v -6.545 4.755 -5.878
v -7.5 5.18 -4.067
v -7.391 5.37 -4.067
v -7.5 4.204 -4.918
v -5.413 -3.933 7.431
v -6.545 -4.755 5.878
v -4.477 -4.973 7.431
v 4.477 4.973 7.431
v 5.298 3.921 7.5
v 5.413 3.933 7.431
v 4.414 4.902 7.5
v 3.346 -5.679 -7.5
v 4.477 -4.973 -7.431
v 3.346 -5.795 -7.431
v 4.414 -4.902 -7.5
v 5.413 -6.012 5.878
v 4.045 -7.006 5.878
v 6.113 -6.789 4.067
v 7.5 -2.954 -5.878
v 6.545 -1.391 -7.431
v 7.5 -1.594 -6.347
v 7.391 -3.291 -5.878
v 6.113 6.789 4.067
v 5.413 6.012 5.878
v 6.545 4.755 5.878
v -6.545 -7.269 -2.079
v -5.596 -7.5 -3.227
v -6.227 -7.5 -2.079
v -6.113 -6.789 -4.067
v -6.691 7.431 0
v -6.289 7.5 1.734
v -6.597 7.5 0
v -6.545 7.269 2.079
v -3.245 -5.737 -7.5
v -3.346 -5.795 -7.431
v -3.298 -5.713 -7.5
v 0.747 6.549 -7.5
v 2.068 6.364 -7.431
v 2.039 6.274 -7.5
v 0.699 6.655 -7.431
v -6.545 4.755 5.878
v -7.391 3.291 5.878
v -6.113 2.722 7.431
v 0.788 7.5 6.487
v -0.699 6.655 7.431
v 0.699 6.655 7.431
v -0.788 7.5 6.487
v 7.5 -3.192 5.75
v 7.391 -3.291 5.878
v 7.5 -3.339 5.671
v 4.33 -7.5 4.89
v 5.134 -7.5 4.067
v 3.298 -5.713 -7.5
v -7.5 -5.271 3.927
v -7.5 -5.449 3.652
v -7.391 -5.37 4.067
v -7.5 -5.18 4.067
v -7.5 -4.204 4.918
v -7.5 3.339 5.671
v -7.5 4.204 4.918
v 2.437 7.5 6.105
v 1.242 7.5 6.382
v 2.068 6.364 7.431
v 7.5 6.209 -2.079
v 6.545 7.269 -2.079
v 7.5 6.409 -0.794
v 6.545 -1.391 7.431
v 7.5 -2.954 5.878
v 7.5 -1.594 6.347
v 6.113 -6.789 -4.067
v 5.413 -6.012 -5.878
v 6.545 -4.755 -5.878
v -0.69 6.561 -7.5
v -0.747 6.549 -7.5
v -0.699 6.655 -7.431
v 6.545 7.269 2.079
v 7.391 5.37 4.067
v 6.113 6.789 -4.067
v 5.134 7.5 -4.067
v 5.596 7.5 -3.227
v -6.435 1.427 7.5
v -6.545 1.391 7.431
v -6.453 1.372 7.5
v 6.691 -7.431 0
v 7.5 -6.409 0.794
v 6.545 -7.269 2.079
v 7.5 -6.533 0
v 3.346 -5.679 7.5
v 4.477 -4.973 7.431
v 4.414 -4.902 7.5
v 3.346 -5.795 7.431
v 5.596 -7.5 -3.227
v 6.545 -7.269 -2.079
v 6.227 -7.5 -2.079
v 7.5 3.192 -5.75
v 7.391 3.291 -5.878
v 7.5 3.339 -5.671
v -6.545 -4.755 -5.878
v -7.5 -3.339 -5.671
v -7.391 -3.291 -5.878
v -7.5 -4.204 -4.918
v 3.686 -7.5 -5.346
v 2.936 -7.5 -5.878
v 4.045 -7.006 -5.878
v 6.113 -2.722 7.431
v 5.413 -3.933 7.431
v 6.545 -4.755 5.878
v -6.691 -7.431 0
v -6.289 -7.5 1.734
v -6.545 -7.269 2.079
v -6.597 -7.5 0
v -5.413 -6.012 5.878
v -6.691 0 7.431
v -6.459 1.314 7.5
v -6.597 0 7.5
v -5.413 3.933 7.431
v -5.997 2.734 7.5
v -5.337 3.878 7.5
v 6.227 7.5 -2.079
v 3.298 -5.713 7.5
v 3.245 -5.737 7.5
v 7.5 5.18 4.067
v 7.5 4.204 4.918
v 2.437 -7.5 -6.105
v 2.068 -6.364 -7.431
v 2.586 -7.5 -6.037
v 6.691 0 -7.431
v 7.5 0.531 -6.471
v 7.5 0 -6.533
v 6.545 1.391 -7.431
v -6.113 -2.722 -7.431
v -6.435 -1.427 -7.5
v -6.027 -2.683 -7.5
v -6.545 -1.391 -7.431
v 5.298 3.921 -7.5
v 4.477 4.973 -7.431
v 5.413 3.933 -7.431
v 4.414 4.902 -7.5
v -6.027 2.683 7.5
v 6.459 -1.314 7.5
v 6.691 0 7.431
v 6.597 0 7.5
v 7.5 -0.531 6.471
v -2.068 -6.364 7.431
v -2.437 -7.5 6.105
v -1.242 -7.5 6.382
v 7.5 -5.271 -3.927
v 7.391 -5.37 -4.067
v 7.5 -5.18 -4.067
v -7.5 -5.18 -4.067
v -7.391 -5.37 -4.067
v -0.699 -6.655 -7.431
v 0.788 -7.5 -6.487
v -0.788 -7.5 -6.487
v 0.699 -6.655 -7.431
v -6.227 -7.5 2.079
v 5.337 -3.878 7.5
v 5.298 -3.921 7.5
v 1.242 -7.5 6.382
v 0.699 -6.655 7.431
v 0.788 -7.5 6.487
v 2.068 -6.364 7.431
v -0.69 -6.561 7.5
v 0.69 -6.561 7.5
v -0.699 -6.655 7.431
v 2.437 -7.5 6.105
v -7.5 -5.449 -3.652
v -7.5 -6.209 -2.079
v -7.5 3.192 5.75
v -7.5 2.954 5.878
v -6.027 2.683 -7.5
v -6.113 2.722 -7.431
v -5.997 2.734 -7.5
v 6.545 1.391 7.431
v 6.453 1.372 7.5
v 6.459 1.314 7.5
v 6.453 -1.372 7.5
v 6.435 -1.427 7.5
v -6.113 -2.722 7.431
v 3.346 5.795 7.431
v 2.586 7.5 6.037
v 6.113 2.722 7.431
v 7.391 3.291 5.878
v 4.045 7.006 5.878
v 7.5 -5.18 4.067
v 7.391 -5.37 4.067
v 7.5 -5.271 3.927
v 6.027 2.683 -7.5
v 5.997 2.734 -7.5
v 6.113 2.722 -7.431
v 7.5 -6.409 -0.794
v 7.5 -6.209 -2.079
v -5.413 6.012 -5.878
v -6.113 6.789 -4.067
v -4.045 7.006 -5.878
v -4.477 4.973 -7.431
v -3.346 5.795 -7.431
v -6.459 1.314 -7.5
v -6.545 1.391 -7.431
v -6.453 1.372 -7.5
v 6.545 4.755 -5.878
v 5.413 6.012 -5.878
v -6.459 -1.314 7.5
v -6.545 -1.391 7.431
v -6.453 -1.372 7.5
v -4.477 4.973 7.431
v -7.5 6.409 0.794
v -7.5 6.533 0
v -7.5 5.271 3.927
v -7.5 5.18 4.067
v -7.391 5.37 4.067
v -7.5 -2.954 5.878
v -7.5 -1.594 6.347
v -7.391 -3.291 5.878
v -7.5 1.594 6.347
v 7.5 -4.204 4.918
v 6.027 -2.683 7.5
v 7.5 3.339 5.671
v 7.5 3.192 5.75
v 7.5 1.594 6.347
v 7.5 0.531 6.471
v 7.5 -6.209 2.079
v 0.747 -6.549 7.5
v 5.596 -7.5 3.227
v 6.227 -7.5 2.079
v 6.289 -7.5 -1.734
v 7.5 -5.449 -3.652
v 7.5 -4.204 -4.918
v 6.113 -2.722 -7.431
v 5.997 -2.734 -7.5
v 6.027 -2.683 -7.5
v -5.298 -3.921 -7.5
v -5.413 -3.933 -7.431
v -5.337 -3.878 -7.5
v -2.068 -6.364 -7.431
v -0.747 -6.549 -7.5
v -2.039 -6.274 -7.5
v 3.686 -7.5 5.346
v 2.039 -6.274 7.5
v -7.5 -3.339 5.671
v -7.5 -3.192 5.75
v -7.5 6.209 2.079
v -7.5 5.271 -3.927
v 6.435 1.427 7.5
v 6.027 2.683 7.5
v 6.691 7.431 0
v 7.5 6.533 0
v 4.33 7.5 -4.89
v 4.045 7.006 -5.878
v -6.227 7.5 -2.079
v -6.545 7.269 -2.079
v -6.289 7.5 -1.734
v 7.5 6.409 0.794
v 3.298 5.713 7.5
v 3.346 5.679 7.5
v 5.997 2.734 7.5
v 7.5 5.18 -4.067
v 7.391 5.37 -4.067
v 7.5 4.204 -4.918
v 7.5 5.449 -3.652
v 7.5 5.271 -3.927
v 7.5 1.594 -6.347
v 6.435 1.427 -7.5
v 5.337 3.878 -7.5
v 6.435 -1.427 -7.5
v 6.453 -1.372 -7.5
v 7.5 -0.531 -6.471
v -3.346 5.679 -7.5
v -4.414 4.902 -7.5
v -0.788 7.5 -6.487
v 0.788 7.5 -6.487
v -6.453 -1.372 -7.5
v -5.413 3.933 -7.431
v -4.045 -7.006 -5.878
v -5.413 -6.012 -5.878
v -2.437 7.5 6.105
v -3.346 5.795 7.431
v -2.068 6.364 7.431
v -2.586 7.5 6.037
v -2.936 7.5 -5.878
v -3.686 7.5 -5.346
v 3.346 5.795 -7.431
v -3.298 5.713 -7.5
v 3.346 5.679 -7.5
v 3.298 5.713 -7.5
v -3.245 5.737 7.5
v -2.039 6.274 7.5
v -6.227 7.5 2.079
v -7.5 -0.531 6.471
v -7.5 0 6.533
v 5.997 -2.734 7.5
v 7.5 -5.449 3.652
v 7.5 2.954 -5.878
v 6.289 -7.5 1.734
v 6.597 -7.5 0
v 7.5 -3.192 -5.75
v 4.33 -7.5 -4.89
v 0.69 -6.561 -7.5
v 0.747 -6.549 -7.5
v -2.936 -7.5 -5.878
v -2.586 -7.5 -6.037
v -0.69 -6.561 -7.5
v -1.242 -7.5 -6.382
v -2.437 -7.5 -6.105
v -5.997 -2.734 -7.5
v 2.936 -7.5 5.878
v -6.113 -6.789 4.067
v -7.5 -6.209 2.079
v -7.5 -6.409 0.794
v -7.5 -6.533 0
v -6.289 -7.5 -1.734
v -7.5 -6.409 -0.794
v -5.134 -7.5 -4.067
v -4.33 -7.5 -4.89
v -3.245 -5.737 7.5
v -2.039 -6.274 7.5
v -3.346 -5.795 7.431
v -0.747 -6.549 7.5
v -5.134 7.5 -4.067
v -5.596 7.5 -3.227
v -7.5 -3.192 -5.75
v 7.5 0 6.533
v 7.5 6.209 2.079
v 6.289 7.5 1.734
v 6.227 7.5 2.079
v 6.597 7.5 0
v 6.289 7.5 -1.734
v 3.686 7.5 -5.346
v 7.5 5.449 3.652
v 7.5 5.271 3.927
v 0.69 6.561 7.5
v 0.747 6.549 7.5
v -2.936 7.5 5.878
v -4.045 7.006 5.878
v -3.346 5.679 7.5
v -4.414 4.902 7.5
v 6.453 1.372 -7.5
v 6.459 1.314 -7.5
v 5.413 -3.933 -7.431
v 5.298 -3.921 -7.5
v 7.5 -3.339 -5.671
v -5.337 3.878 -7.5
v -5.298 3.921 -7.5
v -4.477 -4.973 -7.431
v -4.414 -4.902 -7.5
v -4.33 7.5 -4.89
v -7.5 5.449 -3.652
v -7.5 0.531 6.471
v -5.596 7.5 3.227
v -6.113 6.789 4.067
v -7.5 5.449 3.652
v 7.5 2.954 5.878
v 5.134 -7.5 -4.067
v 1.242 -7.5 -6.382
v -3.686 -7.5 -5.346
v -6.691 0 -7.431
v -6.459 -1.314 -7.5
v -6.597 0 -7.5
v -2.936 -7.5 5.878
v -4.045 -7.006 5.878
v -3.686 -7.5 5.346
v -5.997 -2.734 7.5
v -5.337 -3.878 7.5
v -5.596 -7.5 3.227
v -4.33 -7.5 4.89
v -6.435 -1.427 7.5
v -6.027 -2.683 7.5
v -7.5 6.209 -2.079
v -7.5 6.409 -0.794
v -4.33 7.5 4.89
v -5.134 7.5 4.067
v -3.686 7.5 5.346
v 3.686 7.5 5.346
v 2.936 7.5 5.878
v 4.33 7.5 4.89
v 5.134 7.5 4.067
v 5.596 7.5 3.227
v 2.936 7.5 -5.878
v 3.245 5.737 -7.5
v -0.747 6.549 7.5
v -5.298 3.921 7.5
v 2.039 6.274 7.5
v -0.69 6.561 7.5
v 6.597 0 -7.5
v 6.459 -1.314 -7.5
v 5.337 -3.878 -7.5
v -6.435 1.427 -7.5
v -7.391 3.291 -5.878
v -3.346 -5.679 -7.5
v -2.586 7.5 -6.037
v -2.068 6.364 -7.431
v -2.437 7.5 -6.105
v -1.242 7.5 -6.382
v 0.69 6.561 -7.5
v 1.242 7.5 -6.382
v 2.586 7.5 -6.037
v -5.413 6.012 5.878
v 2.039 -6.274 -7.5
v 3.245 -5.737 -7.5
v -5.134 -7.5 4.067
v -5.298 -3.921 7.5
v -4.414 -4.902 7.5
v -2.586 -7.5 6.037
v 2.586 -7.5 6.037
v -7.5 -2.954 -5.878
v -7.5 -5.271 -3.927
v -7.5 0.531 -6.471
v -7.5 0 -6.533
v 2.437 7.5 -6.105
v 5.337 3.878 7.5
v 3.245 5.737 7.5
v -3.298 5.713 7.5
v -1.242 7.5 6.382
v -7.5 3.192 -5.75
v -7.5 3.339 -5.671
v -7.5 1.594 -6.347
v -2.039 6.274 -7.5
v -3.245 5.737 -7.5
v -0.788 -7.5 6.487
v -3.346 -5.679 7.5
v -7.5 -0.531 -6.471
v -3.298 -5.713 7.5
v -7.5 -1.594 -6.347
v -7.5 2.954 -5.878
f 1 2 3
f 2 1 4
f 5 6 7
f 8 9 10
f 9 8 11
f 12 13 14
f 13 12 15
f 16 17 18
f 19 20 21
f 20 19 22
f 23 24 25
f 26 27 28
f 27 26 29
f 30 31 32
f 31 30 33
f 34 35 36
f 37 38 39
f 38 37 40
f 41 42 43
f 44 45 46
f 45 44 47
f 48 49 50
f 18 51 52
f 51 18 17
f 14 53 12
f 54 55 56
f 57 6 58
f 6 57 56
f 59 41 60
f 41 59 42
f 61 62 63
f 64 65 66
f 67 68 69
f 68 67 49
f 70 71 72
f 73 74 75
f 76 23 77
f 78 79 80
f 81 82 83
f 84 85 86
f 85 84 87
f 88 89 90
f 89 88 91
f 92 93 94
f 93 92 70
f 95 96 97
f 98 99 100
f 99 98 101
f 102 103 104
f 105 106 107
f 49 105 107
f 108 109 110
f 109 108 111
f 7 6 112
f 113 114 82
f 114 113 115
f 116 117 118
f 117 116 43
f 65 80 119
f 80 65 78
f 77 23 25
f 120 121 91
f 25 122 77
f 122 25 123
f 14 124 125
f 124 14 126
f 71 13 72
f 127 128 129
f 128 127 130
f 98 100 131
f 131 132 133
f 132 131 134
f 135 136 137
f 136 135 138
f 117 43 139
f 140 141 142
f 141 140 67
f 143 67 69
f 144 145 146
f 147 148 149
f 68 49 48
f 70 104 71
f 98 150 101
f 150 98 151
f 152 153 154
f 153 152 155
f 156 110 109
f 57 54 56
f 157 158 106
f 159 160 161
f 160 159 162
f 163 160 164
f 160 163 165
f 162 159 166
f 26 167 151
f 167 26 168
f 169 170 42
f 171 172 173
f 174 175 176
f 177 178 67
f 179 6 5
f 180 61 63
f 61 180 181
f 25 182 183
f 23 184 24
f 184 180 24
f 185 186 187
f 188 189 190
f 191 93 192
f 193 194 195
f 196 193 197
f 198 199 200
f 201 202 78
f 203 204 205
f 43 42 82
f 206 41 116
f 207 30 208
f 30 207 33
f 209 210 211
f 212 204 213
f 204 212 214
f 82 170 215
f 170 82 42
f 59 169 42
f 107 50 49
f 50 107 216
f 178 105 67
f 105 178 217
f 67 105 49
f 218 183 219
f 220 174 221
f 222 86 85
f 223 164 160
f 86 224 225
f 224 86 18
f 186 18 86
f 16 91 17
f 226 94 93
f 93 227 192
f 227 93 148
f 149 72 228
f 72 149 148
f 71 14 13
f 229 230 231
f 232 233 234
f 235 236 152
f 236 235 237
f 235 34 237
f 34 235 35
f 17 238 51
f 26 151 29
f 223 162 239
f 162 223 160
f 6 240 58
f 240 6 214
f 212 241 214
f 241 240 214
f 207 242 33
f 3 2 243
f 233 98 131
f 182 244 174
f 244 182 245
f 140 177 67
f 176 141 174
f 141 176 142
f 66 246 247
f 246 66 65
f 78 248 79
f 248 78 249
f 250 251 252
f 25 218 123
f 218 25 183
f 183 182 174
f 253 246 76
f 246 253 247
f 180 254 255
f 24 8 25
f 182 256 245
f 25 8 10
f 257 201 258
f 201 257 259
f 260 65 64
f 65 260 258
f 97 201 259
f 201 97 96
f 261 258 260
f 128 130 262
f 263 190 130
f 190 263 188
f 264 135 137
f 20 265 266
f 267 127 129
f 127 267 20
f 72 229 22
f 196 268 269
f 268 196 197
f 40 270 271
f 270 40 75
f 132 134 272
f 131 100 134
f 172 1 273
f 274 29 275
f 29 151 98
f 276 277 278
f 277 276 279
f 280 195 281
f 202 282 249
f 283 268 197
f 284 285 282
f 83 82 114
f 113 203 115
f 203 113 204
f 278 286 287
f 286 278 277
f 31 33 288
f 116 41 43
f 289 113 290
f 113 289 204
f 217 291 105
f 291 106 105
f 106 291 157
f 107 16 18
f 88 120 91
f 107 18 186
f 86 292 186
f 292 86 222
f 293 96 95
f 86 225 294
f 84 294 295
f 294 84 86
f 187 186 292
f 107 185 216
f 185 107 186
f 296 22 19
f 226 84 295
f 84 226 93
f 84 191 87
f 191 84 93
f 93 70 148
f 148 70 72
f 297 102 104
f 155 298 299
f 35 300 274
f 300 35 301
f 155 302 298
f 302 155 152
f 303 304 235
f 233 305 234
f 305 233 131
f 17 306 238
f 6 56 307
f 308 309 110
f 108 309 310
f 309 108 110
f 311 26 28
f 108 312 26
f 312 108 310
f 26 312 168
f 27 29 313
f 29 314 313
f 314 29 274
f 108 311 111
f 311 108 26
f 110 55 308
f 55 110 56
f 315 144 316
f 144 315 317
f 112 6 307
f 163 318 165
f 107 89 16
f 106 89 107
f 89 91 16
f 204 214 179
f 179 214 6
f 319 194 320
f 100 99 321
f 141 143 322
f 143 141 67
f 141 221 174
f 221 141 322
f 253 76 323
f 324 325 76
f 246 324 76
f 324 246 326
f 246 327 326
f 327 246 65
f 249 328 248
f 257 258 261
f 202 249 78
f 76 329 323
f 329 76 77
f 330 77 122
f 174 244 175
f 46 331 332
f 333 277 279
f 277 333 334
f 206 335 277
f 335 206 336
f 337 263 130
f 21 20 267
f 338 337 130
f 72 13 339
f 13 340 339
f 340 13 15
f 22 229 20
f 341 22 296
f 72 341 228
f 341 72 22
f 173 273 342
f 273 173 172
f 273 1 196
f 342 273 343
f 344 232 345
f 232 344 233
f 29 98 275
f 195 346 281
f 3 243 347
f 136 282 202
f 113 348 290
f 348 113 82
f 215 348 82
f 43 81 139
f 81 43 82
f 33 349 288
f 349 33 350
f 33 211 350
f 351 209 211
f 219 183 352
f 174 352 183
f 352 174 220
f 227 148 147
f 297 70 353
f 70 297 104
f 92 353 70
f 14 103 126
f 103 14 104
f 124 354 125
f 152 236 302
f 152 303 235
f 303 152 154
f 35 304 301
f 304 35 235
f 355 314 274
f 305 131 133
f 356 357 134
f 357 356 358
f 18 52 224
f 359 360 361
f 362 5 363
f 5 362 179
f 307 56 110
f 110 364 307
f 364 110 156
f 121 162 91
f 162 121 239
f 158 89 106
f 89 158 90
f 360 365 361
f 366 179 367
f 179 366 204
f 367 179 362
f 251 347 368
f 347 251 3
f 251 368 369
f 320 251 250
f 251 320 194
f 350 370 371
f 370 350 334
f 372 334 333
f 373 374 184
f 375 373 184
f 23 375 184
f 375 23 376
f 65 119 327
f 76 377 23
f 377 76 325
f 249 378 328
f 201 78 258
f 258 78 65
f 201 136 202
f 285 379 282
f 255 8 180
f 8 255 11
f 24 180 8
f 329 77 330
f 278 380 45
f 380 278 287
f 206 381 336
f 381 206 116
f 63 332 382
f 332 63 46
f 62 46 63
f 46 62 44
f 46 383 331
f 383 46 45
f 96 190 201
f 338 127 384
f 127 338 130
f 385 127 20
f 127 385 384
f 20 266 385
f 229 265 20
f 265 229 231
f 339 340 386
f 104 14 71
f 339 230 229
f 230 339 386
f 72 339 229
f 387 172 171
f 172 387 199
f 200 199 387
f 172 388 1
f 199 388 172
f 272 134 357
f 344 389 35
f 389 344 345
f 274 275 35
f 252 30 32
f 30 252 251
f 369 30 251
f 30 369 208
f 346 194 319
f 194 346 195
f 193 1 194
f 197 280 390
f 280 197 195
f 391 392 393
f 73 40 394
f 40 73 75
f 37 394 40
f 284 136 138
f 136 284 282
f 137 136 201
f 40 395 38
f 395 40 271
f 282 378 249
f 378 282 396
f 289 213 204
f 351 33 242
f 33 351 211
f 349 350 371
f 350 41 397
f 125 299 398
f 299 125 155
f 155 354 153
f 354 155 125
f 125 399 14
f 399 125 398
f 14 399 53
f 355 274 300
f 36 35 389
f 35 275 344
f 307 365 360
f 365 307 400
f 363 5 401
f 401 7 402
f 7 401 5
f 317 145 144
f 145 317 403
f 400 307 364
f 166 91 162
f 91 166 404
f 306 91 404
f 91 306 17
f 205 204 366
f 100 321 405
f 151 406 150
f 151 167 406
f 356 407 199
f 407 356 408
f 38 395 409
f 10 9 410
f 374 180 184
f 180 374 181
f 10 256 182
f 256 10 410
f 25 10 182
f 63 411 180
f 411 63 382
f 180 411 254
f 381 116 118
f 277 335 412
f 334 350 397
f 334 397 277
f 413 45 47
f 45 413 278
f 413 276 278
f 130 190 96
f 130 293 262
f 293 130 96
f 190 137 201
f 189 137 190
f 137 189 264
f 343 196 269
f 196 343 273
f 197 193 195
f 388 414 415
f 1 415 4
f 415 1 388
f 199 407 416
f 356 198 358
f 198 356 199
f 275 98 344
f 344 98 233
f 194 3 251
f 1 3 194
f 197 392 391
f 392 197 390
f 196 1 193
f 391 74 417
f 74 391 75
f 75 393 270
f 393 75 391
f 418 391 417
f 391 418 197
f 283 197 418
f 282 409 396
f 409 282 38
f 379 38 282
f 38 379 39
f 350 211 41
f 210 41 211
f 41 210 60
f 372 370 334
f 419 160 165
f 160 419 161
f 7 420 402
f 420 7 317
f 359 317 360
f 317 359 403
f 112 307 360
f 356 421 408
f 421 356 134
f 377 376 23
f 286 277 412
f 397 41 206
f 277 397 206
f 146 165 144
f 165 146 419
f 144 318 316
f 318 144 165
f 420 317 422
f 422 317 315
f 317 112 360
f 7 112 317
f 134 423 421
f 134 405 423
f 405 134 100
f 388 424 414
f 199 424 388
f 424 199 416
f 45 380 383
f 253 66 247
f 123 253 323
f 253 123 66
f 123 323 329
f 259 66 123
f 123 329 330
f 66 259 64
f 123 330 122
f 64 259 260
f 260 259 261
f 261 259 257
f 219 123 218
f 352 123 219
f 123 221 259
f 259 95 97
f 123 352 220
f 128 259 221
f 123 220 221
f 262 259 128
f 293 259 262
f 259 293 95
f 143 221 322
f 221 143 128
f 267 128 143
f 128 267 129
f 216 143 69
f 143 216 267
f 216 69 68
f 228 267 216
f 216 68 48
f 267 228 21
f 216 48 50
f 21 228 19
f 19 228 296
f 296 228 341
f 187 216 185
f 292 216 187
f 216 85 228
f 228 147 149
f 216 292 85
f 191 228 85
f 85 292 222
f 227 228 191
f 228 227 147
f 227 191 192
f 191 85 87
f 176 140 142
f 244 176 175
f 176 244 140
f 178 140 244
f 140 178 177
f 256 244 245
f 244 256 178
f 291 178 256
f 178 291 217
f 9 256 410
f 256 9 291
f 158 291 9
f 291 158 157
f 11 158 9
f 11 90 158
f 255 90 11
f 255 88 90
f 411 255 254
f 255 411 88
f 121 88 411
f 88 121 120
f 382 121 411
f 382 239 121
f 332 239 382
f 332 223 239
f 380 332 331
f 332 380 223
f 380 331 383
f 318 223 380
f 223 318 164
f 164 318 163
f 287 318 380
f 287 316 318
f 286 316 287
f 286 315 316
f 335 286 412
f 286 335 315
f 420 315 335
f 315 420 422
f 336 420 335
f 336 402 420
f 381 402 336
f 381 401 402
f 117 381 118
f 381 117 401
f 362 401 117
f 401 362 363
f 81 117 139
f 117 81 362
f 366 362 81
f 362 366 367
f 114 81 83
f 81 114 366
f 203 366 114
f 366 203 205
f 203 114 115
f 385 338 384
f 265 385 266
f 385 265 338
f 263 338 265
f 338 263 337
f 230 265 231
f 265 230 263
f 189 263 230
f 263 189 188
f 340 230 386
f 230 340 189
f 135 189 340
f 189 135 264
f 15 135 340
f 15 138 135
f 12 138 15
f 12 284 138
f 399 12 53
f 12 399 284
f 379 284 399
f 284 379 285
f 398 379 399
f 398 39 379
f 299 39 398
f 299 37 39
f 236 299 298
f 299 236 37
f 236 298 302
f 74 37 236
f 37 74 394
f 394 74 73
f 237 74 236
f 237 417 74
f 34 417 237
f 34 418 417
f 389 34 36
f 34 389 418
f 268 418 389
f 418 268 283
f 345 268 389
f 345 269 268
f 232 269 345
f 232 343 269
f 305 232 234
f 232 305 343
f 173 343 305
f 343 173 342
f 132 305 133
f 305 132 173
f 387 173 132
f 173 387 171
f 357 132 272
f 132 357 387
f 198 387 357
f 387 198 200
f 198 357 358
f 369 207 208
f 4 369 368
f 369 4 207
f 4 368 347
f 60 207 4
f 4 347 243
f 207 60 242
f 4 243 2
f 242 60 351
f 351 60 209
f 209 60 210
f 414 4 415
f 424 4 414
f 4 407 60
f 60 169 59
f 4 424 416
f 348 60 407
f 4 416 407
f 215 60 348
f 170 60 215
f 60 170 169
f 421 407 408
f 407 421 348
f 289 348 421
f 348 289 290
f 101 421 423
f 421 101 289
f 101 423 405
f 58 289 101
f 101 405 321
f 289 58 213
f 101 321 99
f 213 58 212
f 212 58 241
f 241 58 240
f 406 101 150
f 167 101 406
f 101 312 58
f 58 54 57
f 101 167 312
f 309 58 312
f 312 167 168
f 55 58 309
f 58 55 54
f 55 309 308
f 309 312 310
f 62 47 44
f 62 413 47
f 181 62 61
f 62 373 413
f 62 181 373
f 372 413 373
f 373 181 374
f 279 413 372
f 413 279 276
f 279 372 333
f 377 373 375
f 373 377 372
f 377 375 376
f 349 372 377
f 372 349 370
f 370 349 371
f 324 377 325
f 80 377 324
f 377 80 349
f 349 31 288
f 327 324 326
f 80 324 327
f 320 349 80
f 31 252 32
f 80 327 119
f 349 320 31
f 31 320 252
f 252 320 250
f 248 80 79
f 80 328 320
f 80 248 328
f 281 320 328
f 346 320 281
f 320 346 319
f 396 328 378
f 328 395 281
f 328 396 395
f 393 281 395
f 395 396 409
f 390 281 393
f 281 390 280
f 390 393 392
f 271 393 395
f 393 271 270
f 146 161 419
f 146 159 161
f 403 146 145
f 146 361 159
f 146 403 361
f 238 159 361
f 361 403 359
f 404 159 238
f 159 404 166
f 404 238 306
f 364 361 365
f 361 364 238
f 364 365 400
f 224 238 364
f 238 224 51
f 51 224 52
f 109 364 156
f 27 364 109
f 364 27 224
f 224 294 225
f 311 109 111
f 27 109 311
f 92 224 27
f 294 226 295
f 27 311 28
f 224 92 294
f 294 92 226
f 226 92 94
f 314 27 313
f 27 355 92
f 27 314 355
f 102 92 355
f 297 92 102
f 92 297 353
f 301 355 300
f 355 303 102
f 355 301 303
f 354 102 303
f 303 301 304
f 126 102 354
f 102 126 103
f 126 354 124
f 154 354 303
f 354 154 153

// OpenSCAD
// Construct Solid Geometry operator: intersection
// Leaves only the volume that is in all of the entries.

render() intersection()
{
	sphere(r=10);
	cube([15,15,15], center=true);
}
